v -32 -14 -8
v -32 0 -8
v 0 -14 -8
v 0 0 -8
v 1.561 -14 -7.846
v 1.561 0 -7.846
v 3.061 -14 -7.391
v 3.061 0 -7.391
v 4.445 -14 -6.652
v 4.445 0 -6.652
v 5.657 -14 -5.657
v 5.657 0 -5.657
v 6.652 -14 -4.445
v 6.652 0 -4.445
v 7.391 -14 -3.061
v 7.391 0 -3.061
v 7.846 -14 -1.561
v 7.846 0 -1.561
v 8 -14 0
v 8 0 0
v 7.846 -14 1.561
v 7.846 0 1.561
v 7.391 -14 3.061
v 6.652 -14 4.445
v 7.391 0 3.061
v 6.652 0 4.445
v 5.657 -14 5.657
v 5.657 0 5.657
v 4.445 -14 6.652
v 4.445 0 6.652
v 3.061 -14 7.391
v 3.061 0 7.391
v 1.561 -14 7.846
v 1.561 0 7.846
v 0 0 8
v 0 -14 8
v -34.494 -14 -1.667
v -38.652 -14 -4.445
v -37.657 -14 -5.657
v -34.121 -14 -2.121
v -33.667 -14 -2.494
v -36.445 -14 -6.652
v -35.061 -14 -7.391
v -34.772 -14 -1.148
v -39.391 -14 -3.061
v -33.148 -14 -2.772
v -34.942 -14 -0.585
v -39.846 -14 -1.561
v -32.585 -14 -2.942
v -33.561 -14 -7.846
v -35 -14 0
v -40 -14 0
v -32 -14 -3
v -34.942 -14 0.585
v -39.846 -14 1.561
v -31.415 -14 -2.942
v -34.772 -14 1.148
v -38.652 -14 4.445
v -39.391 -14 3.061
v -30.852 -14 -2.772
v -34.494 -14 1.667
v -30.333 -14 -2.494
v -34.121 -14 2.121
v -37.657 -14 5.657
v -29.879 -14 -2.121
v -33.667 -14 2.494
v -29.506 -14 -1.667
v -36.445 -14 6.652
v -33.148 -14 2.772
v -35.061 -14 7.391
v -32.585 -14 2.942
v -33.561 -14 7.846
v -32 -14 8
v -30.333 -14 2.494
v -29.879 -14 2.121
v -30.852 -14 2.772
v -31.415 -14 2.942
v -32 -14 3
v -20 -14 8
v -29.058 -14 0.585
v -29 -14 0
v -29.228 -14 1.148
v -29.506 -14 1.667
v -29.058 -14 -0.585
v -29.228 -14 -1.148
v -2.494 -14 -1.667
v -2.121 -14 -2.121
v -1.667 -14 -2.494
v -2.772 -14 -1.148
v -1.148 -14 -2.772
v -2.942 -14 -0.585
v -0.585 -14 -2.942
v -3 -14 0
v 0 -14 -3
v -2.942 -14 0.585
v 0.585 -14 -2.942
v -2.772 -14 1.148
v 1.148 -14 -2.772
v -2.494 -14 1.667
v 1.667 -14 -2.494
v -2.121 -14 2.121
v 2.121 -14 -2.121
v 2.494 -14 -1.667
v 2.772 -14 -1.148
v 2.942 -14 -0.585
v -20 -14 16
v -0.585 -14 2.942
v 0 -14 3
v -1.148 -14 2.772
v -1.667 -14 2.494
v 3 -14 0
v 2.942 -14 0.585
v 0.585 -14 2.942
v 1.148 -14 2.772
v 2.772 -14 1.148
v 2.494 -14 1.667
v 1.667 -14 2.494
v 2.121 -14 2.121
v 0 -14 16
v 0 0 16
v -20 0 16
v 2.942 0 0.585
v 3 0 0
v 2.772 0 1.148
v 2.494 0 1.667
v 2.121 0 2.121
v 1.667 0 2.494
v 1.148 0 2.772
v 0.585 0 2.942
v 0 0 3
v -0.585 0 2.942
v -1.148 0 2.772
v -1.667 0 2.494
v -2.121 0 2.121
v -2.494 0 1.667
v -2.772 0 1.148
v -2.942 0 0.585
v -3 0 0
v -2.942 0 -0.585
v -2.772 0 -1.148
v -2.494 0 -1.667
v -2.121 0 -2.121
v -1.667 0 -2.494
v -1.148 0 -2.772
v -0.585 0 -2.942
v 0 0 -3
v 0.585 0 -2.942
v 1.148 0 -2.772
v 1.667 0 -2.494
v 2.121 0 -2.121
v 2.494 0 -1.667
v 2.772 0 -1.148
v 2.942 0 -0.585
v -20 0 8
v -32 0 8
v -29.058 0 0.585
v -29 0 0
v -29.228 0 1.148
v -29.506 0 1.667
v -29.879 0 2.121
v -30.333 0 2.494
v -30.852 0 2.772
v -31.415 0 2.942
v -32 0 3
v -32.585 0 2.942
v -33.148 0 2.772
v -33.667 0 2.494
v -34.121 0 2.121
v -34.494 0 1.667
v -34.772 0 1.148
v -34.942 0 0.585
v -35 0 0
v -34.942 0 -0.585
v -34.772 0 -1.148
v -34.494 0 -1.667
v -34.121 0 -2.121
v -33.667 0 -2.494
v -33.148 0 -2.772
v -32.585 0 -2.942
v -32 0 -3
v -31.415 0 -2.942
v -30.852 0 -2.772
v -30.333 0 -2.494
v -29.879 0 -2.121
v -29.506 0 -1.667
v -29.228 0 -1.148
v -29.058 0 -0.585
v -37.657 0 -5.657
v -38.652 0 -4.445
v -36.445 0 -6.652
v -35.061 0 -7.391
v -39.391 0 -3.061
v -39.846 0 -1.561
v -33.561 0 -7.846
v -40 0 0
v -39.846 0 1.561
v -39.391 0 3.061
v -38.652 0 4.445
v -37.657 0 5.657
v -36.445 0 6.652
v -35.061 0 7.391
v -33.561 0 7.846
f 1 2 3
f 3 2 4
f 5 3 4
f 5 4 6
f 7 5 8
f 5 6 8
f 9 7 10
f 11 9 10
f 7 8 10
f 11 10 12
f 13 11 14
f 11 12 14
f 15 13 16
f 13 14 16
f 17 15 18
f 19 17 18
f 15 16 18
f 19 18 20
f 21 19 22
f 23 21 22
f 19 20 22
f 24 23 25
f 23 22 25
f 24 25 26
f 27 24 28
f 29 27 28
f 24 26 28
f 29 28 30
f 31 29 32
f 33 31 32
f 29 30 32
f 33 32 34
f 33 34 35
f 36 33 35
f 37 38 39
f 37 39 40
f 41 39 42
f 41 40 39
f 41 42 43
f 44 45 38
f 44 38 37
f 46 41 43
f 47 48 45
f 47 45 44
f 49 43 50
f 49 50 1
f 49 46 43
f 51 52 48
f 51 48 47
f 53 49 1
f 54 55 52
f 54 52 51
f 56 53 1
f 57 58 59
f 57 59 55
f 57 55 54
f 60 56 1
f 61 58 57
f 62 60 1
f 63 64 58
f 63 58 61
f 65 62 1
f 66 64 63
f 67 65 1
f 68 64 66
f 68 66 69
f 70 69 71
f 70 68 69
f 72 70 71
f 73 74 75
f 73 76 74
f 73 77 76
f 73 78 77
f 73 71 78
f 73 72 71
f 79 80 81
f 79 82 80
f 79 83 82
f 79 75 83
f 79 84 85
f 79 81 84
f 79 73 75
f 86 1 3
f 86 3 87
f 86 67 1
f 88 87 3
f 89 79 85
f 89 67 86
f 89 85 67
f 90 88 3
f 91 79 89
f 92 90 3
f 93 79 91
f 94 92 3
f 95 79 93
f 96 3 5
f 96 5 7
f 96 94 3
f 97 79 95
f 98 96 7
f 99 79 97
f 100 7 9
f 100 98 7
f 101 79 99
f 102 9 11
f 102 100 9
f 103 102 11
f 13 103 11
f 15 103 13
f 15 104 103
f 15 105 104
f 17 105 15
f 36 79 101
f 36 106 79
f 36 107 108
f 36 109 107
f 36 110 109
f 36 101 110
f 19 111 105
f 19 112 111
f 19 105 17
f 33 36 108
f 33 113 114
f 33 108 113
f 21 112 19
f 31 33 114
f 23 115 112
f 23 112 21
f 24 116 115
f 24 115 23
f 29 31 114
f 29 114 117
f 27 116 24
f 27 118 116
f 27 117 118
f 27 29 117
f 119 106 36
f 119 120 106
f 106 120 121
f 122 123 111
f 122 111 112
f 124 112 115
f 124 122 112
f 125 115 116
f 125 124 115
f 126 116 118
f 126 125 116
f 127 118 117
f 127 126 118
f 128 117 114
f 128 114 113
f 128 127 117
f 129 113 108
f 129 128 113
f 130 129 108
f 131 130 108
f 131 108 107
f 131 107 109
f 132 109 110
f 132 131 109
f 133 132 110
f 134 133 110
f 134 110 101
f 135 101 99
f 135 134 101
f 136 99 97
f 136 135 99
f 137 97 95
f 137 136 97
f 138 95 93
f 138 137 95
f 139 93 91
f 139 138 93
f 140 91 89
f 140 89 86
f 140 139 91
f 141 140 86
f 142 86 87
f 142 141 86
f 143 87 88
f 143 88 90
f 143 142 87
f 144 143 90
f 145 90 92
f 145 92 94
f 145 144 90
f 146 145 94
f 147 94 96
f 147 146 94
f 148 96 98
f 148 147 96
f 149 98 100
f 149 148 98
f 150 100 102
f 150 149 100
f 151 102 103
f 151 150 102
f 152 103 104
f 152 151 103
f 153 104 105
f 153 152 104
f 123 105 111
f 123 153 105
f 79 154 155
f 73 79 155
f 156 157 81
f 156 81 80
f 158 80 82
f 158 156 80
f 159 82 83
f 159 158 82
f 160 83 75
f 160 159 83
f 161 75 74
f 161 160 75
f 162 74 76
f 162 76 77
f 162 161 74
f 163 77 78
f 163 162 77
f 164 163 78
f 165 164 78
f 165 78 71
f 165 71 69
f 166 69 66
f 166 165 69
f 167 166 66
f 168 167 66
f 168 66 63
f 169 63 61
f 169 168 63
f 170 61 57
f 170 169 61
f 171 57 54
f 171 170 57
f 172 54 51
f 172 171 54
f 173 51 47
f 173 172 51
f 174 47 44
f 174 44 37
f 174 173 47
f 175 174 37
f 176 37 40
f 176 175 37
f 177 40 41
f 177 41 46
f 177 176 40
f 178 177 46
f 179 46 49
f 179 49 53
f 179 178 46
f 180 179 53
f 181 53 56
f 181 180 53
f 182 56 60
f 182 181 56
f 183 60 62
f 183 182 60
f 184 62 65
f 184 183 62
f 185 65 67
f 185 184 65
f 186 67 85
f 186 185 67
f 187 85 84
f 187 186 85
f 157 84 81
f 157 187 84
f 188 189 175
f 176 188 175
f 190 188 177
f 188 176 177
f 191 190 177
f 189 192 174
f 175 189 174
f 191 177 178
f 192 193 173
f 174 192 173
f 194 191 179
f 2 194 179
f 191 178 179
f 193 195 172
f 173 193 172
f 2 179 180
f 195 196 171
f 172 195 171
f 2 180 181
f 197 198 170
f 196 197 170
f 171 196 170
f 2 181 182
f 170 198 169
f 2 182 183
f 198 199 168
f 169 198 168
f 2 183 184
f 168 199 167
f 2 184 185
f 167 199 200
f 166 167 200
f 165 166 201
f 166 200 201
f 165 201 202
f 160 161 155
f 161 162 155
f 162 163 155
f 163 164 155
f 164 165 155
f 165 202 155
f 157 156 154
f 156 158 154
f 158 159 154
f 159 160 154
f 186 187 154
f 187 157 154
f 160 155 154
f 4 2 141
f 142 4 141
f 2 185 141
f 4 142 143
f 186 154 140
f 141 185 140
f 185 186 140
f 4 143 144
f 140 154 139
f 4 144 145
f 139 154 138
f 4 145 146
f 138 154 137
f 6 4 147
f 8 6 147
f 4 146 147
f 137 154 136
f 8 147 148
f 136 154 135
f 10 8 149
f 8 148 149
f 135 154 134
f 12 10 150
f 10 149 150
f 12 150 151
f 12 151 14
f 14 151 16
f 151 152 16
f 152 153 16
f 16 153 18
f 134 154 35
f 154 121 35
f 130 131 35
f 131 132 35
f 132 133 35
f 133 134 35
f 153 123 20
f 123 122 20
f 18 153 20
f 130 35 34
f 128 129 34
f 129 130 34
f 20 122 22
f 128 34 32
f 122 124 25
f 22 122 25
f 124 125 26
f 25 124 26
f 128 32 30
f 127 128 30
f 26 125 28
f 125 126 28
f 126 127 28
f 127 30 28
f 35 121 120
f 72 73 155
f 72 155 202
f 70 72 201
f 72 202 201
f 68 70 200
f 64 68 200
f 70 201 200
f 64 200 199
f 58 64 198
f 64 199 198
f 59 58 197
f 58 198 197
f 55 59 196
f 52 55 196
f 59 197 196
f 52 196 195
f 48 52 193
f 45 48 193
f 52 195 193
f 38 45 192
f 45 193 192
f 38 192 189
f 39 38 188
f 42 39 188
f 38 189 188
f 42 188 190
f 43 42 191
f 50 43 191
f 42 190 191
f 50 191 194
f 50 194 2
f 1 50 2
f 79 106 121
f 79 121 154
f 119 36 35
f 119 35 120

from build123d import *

# Parameters (mm, degrees)
F0_R     = 3
F1_DEPTH = 14


with BuildPart() as f1:
    # F0 (on Front) → F1 (new body)
    with BuildSketch(Plane.XZ):
        with BuildLine():
            Line((-20, 8), (-32, 8))
            ThreePointArc((-32, 8), (-40, 0), (-32, -8))
            Line((-32, -8), (0, -8))
            ThreePointArc((0, -8), (8, 0), (0, 8))
            Line((0, 8), (0, 16))
            Line((0, 16), (-20, 16))
            Line((-20, 16), (-20, 8))
        make_face()
        with Locations((-32, 0)):
            Circle(F0_R, mode=Mode.SUBTRACT)
        Circle(F0_R, mode=Mode.SUBTRACT)
    extrude(amount=F1_DEPTH)


solid = f1.part
